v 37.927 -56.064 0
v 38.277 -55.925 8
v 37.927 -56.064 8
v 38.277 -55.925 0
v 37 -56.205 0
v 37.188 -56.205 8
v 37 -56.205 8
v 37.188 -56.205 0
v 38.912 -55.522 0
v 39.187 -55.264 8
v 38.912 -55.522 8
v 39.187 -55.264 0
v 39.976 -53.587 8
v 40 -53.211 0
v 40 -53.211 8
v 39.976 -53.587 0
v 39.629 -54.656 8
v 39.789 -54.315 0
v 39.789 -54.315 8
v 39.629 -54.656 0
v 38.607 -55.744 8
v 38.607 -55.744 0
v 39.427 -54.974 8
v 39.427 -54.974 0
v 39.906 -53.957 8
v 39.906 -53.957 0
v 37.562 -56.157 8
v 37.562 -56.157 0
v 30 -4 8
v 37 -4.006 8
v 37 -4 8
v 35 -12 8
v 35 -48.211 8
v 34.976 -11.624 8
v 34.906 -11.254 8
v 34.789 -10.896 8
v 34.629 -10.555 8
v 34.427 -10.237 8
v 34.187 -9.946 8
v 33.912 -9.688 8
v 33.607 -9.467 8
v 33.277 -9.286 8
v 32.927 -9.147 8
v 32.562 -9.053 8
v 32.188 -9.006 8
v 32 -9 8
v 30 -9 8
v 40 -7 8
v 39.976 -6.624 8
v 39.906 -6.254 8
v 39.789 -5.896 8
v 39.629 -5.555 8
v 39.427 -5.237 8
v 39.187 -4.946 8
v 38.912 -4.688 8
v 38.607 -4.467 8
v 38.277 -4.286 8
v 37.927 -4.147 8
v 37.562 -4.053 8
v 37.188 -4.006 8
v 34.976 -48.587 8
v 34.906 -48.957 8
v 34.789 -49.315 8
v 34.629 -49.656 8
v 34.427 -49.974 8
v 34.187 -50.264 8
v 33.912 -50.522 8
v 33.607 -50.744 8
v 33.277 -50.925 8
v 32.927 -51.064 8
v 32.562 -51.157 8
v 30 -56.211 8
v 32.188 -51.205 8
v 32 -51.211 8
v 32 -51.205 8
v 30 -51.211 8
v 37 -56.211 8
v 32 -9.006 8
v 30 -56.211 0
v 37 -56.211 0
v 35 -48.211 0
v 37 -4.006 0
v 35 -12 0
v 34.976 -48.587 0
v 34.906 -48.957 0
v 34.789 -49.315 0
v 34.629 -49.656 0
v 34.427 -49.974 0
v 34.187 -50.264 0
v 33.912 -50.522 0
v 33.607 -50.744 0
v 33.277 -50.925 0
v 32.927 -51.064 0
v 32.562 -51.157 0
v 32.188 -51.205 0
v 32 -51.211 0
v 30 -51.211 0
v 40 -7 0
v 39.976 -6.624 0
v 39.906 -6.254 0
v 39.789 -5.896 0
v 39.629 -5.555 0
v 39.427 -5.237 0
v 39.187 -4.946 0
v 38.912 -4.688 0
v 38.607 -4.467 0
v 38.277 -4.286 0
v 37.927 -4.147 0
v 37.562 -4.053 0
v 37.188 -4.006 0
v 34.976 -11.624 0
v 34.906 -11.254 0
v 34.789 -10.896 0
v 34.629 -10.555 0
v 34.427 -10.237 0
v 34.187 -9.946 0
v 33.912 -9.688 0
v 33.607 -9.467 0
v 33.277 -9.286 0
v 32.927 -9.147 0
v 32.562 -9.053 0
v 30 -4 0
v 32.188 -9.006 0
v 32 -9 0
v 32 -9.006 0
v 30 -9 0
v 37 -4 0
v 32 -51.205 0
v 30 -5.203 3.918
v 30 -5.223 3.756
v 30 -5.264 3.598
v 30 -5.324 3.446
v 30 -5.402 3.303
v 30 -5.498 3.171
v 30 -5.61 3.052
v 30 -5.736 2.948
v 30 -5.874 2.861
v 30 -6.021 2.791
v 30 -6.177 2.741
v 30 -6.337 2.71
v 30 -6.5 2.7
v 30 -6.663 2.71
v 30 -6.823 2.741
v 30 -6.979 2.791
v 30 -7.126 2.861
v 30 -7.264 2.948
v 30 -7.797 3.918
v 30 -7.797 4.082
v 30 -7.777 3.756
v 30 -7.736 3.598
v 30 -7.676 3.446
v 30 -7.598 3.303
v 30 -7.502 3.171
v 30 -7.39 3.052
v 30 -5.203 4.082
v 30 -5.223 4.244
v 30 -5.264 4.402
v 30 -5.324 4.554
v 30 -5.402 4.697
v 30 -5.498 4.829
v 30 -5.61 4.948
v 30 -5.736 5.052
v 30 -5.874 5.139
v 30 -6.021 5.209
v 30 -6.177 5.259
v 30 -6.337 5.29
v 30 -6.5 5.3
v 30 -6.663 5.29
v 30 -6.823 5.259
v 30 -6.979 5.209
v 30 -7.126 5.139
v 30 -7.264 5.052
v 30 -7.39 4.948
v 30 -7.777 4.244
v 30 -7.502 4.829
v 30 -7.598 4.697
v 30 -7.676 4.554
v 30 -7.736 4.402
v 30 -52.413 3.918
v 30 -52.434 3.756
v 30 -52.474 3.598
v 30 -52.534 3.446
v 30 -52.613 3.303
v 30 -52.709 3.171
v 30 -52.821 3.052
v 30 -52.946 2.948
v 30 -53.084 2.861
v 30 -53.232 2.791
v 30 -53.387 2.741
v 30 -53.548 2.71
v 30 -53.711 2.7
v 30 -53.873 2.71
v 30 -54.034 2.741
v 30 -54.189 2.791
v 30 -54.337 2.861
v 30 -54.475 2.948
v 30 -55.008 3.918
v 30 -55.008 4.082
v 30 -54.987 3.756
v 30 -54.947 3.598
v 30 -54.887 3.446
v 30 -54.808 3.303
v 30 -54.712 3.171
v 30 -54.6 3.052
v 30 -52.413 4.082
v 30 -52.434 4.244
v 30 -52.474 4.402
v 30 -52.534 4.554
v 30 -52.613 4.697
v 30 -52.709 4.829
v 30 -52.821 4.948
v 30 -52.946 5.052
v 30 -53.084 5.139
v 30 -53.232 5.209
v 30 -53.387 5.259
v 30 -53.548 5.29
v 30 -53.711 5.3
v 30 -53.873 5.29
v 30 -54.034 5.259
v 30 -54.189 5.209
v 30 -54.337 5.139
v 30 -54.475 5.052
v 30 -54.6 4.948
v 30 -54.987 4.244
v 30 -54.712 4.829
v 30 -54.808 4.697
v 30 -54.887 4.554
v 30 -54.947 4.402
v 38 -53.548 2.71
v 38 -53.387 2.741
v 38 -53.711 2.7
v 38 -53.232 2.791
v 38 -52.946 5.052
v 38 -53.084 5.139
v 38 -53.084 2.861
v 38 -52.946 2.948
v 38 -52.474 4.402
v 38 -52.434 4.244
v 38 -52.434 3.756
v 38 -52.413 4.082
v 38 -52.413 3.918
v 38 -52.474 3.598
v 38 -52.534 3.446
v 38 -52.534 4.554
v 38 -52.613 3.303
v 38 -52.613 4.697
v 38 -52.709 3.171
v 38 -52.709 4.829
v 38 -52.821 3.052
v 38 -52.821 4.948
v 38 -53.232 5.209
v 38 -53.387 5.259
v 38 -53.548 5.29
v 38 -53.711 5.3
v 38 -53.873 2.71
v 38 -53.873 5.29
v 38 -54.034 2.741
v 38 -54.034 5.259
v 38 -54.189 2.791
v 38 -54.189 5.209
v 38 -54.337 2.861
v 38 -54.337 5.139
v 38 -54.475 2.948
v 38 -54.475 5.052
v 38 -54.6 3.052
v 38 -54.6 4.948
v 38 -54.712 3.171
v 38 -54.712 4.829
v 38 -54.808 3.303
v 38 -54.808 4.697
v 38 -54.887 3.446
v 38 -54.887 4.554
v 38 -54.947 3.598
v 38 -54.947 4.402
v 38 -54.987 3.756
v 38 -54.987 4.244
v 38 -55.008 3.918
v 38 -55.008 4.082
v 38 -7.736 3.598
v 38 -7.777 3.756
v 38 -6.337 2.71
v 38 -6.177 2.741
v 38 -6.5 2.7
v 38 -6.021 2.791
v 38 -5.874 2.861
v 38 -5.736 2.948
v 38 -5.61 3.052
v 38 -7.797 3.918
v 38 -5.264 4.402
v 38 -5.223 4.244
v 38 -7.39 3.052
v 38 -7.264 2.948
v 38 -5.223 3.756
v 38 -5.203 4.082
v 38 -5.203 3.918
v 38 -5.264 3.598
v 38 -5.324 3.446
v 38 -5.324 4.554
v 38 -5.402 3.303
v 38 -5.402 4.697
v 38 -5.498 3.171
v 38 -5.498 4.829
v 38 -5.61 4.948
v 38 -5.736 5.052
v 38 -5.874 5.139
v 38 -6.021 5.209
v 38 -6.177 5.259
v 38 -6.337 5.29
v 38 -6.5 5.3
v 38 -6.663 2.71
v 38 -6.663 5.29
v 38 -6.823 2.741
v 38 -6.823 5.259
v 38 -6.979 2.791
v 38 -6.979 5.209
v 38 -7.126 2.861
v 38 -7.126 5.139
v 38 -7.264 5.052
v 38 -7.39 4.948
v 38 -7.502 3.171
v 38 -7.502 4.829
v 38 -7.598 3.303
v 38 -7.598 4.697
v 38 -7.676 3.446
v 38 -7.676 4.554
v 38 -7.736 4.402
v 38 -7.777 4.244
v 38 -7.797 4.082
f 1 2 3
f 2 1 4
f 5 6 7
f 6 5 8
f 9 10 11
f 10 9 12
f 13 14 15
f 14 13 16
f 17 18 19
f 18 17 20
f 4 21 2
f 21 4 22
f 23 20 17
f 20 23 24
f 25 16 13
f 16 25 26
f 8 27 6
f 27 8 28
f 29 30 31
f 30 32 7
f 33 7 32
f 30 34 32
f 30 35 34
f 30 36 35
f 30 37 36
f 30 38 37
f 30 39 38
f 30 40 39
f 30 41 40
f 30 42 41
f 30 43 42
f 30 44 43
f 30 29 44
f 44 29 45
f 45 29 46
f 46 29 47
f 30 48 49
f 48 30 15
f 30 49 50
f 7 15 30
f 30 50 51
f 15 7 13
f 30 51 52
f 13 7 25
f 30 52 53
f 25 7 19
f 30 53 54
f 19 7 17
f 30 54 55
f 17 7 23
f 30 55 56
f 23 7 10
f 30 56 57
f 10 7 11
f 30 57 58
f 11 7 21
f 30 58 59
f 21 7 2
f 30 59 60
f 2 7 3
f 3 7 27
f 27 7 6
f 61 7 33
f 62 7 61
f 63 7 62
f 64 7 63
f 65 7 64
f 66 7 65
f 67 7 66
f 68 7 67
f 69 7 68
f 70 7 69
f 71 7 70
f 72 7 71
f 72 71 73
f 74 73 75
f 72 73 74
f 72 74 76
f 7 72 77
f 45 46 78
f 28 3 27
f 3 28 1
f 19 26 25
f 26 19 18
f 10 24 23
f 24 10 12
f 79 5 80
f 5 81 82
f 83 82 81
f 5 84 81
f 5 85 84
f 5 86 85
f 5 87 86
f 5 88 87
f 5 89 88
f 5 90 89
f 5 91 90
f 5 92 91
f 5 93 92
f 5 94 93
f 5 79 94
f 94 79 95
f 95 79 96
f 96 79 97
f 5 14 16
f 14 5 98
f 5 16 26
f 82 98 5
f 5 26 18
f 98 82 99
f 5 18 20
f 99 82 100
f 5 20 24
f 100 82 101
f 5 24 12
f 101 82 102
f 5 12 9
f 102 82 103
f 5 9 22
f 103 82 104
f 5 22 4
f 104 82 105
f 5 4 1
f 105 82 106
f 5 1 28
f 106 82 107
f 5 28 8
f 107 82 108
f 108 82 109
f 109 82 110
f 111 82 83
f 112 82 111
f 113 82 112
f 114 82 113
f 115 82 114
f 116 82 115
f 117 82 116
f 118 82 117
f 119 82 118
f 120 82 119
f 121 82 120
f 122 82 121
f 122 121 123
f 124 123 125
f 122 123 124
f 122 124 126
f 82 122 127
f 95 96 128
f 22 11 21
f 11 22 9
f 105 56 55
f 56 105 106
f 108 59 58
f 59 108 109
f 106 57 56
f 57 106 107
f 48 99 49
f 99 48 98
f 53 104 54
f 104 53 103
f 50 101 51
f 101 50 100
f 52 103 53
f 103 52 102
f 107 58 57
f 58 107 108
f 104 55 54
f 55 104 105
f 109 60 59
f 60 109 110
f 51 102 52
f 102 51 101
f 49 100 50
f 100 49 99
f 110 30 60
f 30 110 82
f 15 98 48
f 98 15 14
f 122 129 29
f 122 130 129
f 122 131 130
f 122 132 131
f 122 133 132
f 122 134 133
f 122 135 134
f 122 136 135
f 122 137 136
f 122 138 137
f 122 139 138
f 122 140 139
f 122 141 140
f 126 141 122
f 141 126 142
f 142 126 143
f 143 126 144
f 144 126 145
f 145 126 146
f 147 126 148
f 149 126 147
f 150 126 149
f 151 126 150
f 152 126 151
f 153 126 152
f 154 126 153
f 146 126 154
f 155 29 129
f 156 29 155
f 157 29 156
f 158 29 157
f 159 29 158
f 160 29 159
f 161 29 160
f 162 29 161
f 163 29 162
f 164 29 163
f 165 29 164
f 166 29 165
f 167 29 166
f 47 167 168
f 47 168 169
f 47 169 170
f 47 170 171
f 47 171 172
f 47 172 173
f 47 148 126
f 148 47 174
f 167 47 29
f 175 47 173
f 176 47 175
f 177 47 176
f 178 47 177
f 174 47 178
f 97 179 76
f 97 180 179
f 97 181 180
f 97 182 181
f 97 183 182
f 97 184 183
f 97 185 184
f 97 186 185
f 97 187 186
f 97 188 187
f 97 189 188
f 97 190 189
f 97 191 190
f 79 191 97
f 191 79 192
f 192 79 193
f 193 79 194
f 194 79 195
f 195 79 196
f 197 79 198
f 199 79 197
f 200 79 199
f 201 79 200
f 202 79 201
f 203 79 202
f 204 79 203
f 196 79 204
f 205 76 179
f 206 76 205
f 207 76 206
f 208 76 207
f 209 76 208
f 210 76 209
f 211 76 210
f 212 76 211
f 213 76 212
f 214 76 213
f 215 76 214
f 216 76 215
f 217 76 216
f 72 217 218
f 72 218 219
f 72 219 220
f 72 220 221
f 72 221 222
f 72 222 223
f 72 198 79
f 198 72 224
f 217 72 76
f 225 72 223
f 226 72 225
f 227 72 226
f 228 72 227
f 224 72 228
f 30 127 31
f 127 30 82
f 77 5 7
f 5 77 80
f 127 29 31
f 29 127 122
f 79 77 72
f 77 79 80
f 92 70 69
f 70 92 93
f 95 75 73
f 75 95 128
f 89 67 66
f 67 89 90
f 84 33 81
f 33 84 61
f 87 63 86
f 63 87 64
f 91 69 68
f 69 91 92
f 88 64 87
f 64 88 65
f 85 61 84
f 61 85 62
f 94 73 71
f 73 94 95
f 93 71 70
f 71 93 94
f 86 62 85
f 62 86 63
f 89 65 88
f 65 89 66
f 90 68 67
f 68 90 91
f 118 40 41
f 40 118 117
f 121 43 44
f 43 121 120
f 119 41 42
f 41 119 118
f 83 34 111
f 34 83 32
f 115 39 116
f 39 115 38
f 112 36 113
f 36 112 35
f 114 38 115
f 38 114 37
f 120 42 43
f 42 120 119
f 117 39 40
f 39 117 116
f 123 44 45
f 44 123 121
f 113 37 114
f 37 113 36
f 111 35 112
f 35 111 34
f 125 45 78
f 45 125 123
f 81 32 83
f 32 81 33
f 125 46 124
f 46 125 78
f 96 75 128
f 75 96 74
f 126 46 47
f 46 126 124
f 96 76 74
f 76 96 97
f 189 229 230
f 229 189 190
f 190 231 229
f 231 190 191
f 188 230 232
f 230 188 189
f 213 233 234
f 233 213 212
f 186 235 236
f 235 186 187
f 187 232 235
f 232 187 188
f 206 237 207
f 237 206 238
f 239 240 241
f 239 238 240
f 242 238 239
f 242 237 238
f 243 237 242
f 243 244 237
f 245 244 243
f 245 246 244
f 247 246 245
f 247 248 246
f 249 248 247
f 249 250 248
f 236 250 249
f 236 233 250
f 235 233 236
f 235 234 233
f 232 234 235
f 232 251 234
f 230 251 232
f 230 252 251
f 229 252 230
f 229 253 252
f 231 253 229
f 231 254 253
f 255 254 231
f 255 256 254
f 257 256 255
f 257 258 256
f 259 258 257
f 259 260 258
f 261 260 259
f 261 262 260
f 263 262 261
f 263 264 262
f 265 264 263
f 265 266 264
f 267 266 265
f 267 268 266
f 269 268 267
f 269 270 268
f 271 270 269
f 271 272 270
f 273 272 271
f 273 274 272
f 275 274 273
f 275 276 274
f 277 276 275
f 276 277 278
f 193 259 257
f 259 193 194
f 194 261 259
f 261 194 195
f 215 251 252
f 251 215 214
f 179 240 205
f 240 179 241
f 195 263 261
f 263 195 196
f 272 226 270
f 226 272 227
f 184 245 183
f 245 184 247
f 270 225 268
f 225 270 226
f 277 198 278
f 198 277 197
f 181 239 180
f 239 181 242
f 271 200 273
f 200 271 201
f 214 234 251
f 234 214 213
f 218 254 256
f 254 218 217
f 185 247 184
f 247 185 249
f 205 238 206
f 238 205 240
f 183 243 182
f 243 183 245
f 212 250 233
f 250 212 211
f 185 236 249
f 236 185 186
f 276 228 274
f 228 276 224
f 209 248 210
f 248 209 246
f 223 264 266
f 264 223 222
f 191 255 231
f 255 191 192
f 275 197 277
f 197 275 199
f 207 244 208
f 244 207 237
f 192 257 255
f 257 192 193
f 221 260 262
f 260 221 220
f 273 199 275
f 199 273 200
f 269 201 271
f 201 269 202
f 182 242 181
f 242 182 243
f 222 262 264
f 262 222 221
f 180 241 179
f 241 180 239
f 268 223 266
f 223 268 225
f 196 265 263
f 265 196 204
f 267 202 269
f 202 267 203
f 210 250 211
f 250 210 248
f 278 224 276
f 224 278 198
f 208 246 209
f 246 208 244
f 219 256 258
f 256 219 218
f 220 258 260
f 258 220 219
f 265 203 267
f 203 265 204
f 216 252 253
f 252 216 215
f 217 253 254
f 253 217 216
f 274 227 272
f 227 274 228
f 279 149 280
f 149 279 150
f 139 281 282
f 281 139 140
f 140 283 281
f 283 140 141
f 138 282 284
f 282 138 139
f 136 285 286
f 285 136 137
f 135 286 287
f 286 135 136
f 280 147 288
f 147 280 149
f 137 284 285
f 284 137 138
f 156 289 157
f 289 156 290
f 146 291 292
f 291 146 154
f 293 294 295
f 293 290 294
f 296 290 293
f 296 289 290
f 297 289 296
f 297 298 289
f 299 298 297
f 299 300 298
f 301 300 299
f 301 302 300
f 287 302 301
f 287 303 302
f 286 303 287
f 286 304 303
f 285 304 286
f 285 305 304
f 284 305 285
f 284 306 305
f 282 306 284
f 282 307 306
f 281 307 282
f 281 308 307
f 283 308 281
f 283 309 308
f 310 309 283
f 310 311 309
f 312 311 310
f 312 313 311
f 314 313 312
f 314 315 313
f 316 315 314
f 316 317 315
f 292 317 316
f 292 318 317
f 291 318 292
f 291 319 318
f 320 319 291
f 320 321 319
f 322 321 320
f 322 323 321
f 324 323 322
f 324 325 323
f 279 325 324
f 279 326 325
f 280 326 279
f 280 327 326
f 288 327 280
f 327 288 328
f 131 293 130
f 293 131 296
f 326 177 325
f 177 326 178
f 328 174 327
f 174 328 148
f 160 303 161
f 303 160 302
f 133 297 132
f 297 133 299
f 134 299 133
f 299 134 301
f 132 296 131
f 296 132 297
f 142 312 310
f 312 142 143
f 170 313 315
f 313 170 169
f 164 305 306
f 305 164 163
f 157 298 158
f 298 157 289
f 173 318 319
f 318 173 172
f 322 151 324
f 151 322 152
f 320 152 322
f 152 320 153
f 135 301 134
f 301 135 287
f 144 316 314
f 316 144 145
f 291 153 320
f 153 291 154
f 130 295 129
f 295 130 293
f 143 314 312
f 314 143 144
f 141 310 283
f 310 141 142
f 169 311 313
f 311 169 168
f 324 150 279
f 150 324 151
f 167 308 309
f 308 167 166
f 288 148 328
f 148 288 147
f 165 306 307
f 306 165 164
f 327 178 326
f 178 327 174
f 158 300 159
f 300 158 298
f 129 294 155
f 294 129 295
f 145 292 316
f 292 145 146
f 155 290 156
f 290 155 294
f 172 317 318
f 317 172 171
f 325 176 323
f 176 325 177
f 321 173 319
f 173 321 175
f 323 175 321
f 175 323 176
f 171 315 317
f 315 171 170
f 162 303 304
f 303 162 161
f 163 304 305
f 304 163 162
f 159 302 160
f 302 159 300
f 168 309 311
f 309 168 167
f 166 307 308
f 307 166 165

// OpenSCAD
//Which part to print
Part = "c"; // [a:Frame, b:Drawer, c:Handles]

//Height of drawer in units
u = 2;

//Depth of drawer
dp = 115;

//Slip between drawer and frame
slip=0.5;


go();
module go(){    
        if(Part=="a"){
            print_frame();
        }else if(Part=="b"){
            print_drawer();
        }else if(Part=="c"){
            print_handles();
        }
}
            



module print_frame(){
    difference(){
        frontplate(u,[],[],[],[],[]);       
        translate([30,0,0]){cube([width-20,u*unit,dp]);}       
    }    
    difference(){
        translate([28,0,gauge]){cube([width-20+4,u*unit,dp]);}
        translate([30,2,gauge-1]){cube([width-20,u*unit-4,dp+2]);}
        }
    translate([20,0,gauge]){cube([115,2,dp]);}
    translate([20,u*unit-2,gauge]){cube([115,2,dp]);}
}



module print_drawer(){
    half = (width+40)/2;
    hhhd = (4*unit-9)/2; //half handle hole distance for 4U handle
    intersection(){
        difference(){
            frontplate(u,[],[],[],[],[]);       
            translate([20,0,gauge]){cube([width,u*unit,gauge]);}//remove support            
                translate([half+hhhd,(u*unit)/2,gauge-0.25]){rotate([180,0,0]){screw();}}
                translate([half-hhhd,(u*unit)/2,gauge-0.25]){rotate([180,0,0]){screw();}}
        }
        translate([30+slip,0,0]){cube([width-20-slip*2,u*unit,dp]);}       
    } 
    
    difference(){
        translate([30+slip,2+slip,gauge]){cube([width-20-2*slip,u*unit-4-2*slip,dp]);}    
        translate([30+slip+2,2+slip+2,gauge-0.01]){cube([width-20-2*slip-4,u*unit-4-2*slip,dp-2]);}
    }
}
    
  
module print_handles(){      
   // handle(u,true);
    difference(){ //remove the extra handle, it prints a set.
        translate([30,0,0]){handle(4,true);}
        translate([42,-100,-1]){cube([20,100,10]);}
    }
}















































$fn = 50*1;

//Constants, do not change !
sixinch   = 155*1;       // cm = 6"  
width     = 155-20-20;   // 11.5cm between rails
unit      = (44.5/19)*6; // 1U
gauge     = 3*1;
gauge_box = 2*1;

//Cabinet screws in mm. They can be changed a little
screw_head        = 7.4; 
screw_head_height = 2.2;  
screw_dia         = 3;   
screw_hole        = 2.6; 
screw_length      = 15;
nut_4mm           = 8.1; 
slip              = 0.35;




module chimney() {    
for(i=[0:8:80]){
    echo(i);
    translate([20 + (width-80)/2  +i,-1,20]){
        minkowski(){
            cube([0.01,200,30]);    
            sphere(d=2,h=1);        
        }
    }
}
}



 
     
 module back_plate(u,dp,screw_top,screw_bottom,screw_side,square_hole,round_hole){
    
     difference(){
        union(){
            translate([20+gauge_box+slip,gauge_box+slip,gauge+dp-gauge_box]){
                cube([width-2*gauge_box-2*slip, u*unit-2*gauge_box-2*slip, gauge_box]);
            }
        }
     
     //Square holes
        for(i=[0:len(square_hole)-1]){
            x = square_hole[i][0];
            y = square_hole[i][1];
            w = square_hole[i][2];
            h = square_hole[i][3];            
            translate([x+20+gauge_box,y+gauge_box,dp-1]){cube([w,h,gauge+2]);}        
        } 
    
    //Round holes
    if(len(round_hole)>0){
        for(i=[0:len(round_hole)-1]){
            x = round_hole[i][0];
            y = round_hole[i][1];
            dia = round_hole[i][2];
            translate([20+gauge_box+x,gauge_box+y,dp-4]){  cylinder(d=dia,h=10); }
        }
    }
        
    
    //Screw holes
    if(len(screw_top)>0){
        for(i=[0:len(screw_top)-1]){
            p = screw_top[i];
            translate([p,unit*u-gauge_box-4,gauge+dp+0.1]){rotate([0,180,0]){screw();}}
            translate([sixinch-p,unit*u-gauge_box-4,gauge+dp+0.1]){rotate([0,180,0]){screw();}} 
        }
    }
    if(len(screw_bottom)>0){
        for(i=[0:len(screw_bottom)-1]){
            p = screw_bottom[i]; 
            translate([p,gauge_box+4     ,gauge+dp+0.1]){rotate([0,180,0]){screw();}}
            translate([sixinch-p,    gauge_box+4    ,gauge+dp+0.1]){rotate([0,180,0]){screw();}} 
        }
    }
    
    if(len(screw_side)>0){
        for(i=[0:len(screw_side)-1]){
            p = screw_side[i];  
            translate([sixinch-20-6,    unit*p    ,gauge+dp+0.1]){rotate([0,180,0]){screw();}} 
            translate([20+6,    unit*p    ,gauge+dp+0.1]){rotate([0,180,0]){screw();}}   
        }
    }
}
}

 
 


module peg(x,y,od,id,he){
    translate([x,y,0]){
        rotate([-90,0,0]){
            difference(){
                cylinder(r2=od/2,r1=od*1.5,h=he);
                translate([0,0,-0.5]){cylinder(r1=id/2,h=he+1);}
            }        
        }
    }
}



module screwtrap(){  
    difference(){
        translate([0,0,5]){
            intersection(){
                scale([1,1,0.7]){
                    sphere(r=8);     
                }   
                translate([0,-0.001,-10]){  cube([20,20,20]);}
            }
        }  
        translate([2,4,5]){
            rotate([90,90,90]){
               translate([0,0,-10]){ cylinder(r=screw_dia/2,h=20,$fn=100);}
            }
        }    
    }
}





module nuttrap(){
    difference(){
        linear_extrude(10){
            polygon(points=[[0,0],[8,0],[2,8],[0,8]]);
        }
        translate([2,4,5]){
            rotate([90,90,90]){
                cylinder(r=nut_4mm/2,h=20,$fn=6);
            }
        }
        translate([2,4,5]){
            rotate([90,90,90]){
               translate([0,0,-10]){ cylinder(r=screw_dia/2,h=20,$fn=100);}
            }
        }
    }
}








module cabinet (dp,u,screw_bottom_front,round_peg,screw_side_front){
    difference(){
        box(dp,u,screw_bottom_front,round_peg,screw_side_front);
                        
               translate([20,unit/2+3,sixinch-40]){ cylinder(d=gauge_box,h=41);}
               translate([20,unit/2+0,sixinch-40]){ cylinder(d=gauge_box,h=41);}
               translate([20,unit/2-3,sixinch-40]){ cylinder(d=gauge_box,h=41);}
            
               translate([20+width,unit/2+3,sixinch-40]){ cylinder(d=gauge_box,h=41);}
               translate([20+width,unit/2+0,sixinch-40]){ cylinder(d=gauge_box,h=41);}
               translate([20+width,unit/2-3,sixinch-40]){ cylinder(d=gauge_box,h=41);}
               
              
        }
       
    }





module box(dp,u,screw_bottom_front,round_peg,screw_side_front){
    difference(){
        translate([20,0,gauge]){
            difference(){
                cube([115,u*unit,dp]);
                translate([gauge_box,gauge_box,-1]){ cube([115-gauge_box*2,u*unit,dp+2]);}                        
            }            
        }
        //CHIMNEY
        chimney(); 
    }
    
    //Screw mounts on the bottom plate
    for(i=[0:len(screw_bottom_front)-1]){
        p = screw_bottom_front[i];
        translate([p+5,gauge_box,gauge]){rotate([0,-90,0]){screwtrap();}}
        translate([sixinch-p+5,gauge_box,gauge]){rotate([0,-90,0]){screwtrap();}}        
        translate([p-5,gauge_box,gauge+dp-gauge_box]){rotate([0,90,0]){screwtrap();}}
        translate([sixinch-p-5,gauge_box,gauge+dp-gauge_box]){rotate([0,90,0]){screwtrap();}}
   }
    
   //Screw mounts on the side of cabinet
   if(len(screw_side_front)>0){
        for(i=[0:len(screw_side_front)-1]){
            p = screw_side_front[i]*unit;
                translate([20+gauge_box,p-5,gauge]){rotate([0,-90,-90]){screwtrap();}}
                translate([sixinch-20-gauge_box,p+5,gauge]){rotate([0,-90,90]){screwtrap();}}    
                translate([20+gauge_box,p+5,gauge+dp-gauge_box]){rotate([0,90,-90]){screwtrap();}}
                translate([sixinch-20-gauge_box,p-5,gauge+dp-gauge_box]){rotate([0,90,90]){screwtrap();}}    
        }
    }
    
    //Screw mounts for lid. Two on each side, three if dp>90
    translate([20+gauge_box,unit*u-gauge_box,gauge+10]){           rotate([0,0,-90]){screwtrap();}}    
    translate([20+gauge_box,unit*u-gauge_box,gauge+dp-10-10]){       rotate([0,0,-90]){screwtrap();}}            
    translate([sixinch-20-gauge_box,unit*u-gauge_box,gauge+10+10]){  rotate([180,0,-90]){screwtrap();}}
    translate([sixinch-20-gauge_box,unit*u-gauge_box,gauge+dp-10-10+10]){  rotate([180,0,-90]){screwtrap();}}
    if(dp>90){
        translate([sixinch-20-gauge_box,unit*u-gauge_box,gauge+dp/2-5+10]){rotate([180,0,-90]){screwtrap();}}
        translate([20+gauge_box,unit*u-gauge_box,gauge+dp/2-5]){rotate([0,0,-90]){screwtrap();}}
    }
    
    //Vertical print support
    /*translate([20+gauge_box,0,gauge+10+2])       {cube([7,u*unit-gauge_box,0.5]);}
    translate([20+gauge_box,0,gauge+dp-10-10+2]) {cube([7,u*unit-gauge_box,0.5]);}    
    translate([sixinch-20-gauge_box-7,0,gauge+10+2])       {cube([7,u*unit-gauge_box,0.5]);}
    translate([sixinch-20-gauge_box-7,0,gauge+dp-10-10+2]) {cube([7,u*unit-gauge_box,0.5]);}
    if(dp>90){
       translate([20+gauge_box,0,gauge+dp/2-3])       {cube([7,u*unit-gauge_box,0.5]);}
       translate([sixinch-20-gauge_box-7,0,gauge+dp/2-3])       {cube([7,u*unit-gauge_box,0.5]);}
    }*/
    
    
    
    module sup(){
        translate([0,-u*unit+gauge_box,2]){
            cube([7,u*unit-gauge_box,0.5]);
        }
    } 
    
    //Lid rest bar 
    translate([20+gauge_box,unit*u-3-gauge_box,gauge]){
        linear_extrude(dp-gauge_box){polygon (points=[[0,0],[3,3],[0,3]]);}
    }
    translate([sixinch-20-gauge_box,unit*u-3-gauge_box,gauge]){
        linear_extrude(dp-gauge_box){polygon (points=[[0,0],[-3,3],[0,3]]);}
    }
        
    // Back/front rest bar
    
    translate([20,gauge_box,dp+gauge-3-gauge_box]){
        rotate([0,90,0]){
            linear_extrude(width){polygon (points=[[-3,0],[-3,3],[0,0]]);}
        }
    }
    
    translate([20+width-gauge_box,0,dp+gauge-3-gauge_box]){
        rotate([0,90,90]){
            linear_extrude(unit*u-gauge_box){polygon (points=[[-3,0],[-3,3],[0,0]]);}
        }
    }
    
    translate([ 20+gauge_box ,0,dp+gauge-3-gauge_box]){
        rotate([0,90,90]){
            linear_extrude(unit*u-gauge_box){polygon (points=[[-3,0],[-3,-3],[0,0]]);}
        }
    }
    
    
/*    translate([0,0,dp+gauge-2-gauge_box]){
        difference(){
            translate([20,0,0]){  cube([width,unit*u-gauge_box,2]);  }
            translate([20+gauge_box+2,gauge_box+2,-1]){  cube([width-2*gauge_box-4,unit*u,4]);  }        
        }
    }*/
              
    //PEGS Relative to inside corner
    translate([20+gauge_box,0,gauge]){ 
        if(len(round_peg)>0){
            for(i=[0:len(round_peg)-1]){
                x = round_peg[i][0];
                y = round_peg[i][1];
                od = round_peg[i][2];
                id = round_peg[i][3];  
                he = round_peg[i][4];      
                translate([x,0,y]){peg(0,0,od,id,he); }
             }        
        }
    }    
}


module lid(dp,u,screw_front,screw_back){    

    difference(){
    union(){ 
        if(len(screw_front)>0){
            for(i=[0:len(screw_front)-1]){                                
                p = screw_front[i];                
                translate([p-5,unit*u-gauge_box,gauge]){rotate([0,-90,180]){screwtrap();}}
                translate([sixinch-p-5,unit*u-gauge_box,gauge]){rotate([0,-90,180]){screwtrap();}}
            }
        }        
        if(len(screw_back)>0){
            for(i=[0:len(screw_back)-1]){                                
                p = screw_back[i];                                
                translate([p+5,unit*u-gauge_box,gauge+dp-gauge_box]){rotate([0,90,180]){screwtrap();}}
                translate([sixinch-p+5,unit*u-gauge_box,gauge+dp-gauge_box]){rotate([0,90,180]){screwtrap();}} 
            }
        }

        //lid
        translate([20+gauge_box+slip,u*unit-gauge_box,gauge]){
            cube([115-gauge_box*2-slip*2,gauge_box,dp]);
        }    
        //back rest
        translate([sixinch/2-40,u*unit-gauge_box-2,gauge+dp-2-gauge_box]){
            cube([80,2,2]);
        }
    }        

    //Negative
    translate([20+gauge_box+4,unit*u+0.01  ,gauge+10+5]){rotate([90,0,0]){screw();}}
    translate([20+gauge_box+4,unit*u+0.01  ,gauge+dp-10-10+5]){rotate([90,0,0]){screw();}}    
    translate([sixinch-20-gauge_box-4,unit*u+0.01   ,gauge+10+10-5]){rotate([90,0,0]){screw();}}
    translate([sixinch-20-gauge_box-4,unit*u +0.01  ,gauge+dp-10-10+10-5]){rotate([90,0,0]){screw();}}
    if(dp>90){
        translate([sixinch-20-gauge_box-4,unit*u+0.01   ,gauge+dp/2-5+10-5]){rotate([90,0,0]){screw();}}    
        translate([20+gauge_box+4,unit*u+0.01   ,gauge+dp/2-5+5]){rotate([90,0,0]){screw();}}
    }
     chimney();

    
}        
}




module screw(){
    cylinder(r1=screw_head/2, r2=screw_dia/2, h=screw_head_height);
    cylinder(r=screw_dia/2, h=40);    
    translate([0,0,-0.99]){cylinder(r=screw_head/2, h=1);}    
}


module frontholes(u,screw_top,screw_bottom_front,screw_side_front){
    if(len(screw_bottom_front)>0){ 
    for(i=[0:len(screw_bottom_front)-1]){
        p = screw_bottom_front[i];
        translate([p,gauge_box+4,-0.01]){screw();}
        translate([sixinch-p,gauge_box+4,-0.01]){screw();}
    } 
    }    
    if(len(screw_side_front)>0){   
        for(i=[0:len(screw_side_front)-1]){
            p = screw_side_front[i]*unit;
            translate([20+gauge_box+4,p,-0.01]){screw();}
            translate([sixinch-20-gauge_box-4,p,-0.01]){screw();}    
        } 
    }   
    if(len(screw_top)>0){   
    for(i=[0:len(screw_top)-1]){
        p = screw_top[i];
        translate([p,unit*u-gauge_box-4,-0.01]){screw();}
        translate([sixinch-p,unit*u-gauge_box-4,-0.01]){screw();}    
    }
    }
}  
    




module handle(u,print){
    
    if(print){
        translate([16,-u*unit,8]){rotate([0,90,0]){handle1(u);}}
        translate([0,-u*unit,8]){rotate([0,90,0]){handle1(u);}}
    }else{
        translate([22,2,0]){rotate([0,180,0]){handle1(u);}}
        translate([sixinch-14,2,0]){rotate([0,180,0]){handle1(u);}}        
    }        
}

module handle1(u){
    difference(){
        handle2(8,u*unit-4,10,3);
        translate([-1,5,-1]){handle2(10,u*unit-10-4,6,3);}
    
        translate([4,2.5,-1]){          cylinder(r=screw_hole/2,h=9);}
        translate([4,u*unit-4-2.5,-1]){ cylinder(r=screw_hole/2,h=9);}
    }
}


module handle2(w,h,d,ra){          
    translate([0,ra,d-ra]){
        rotate([0,90,0]){
            cylinder(r=ra,h=w);
        }
    }
    translate([0,h-ra,d-ra]){
        rotate([0,90,0]){
            cylinder(r=ra,h=w);
        }
    }        
    translate([0,ra,0]){
        cube([w,h-ra-ra,d]);
    }
    cube([w,h,d-ra]);    
}





module insideprofile(l){
    difference(){
        union(){
            translate([7.6,10,0]){cube([4.8,10,l]);}
            translate([0,7.6,0]){cube([20,4.8,l]);}  
            
            translate([6.5,10-2.1,0]){cube([7   ,10,l]);}
            translate([2.1,6.5,0]){cube([15.8,7   ,l]);}  
        }
        translate([4,4,-1]){
            cube([12,12,l+2]);
        }
    } 
    translate([20,20,0]){
        rotate([0,-90,0]){
            linear_extrude(20){
                polygon (points=[[0,0],[l,0],[0,l]]);
            }
        }
    }    
}



module rightbottomplate(t){
    difference(){
        bottomplate(t);
        translate([-1,-1,-1]){
            cube([(sixinch+20)/2+1,sixinch+20+2,t+2]);
        }
    }
}

module leftbottomplate(t){
    difference(){
        bottomplate(t);
        translate([(sixinch+20)/2,-1,-1]){
            cube([(sixinch+20)/2+1,sixinch+20+2,t+2]);
        }
       # translate([10,10,-1]){cylinder(r=2.5,h=base+2);}
        translate([10,sixinch+20-10,-1]){cylinder(r=2.5,h=base+2);}
    
        
        translate([(sixinch+20)/2-20,-1,2.1]){cube([40,sixinch+20+2,2]);}
        
        }
    
    translate([0,0,base]){insideprofile(10);}
    rotate([0,0,180]){translate([-20,-sixinch-20,base]){insideprofile(10);}}   
}


module bottomplate(t){
translate([1,1,0]){
    minkowski(){
        cube([sixinch+20-2,sixinch+20-2,t-1]);
        cylinder(r=1,h=1);
    }
}
}




module frontplate(u,square_hole,round_hole,round_peg,screw_side_front,screw_top,screw_bottom_front){

    difference(){
        baseplate(u);
        
                   
        
        //Square holes
        if(len(square_hole)>0){
        for(i=[0:len(square_hole)-1]){
            x = square_hole[i][0];
            y = square_hole[i][1];
            w = square_hole[i][2];
            h = square_hole[i][3];            
            translate([x,y,-1]){cube([w,h,gauge+2]);}        
        } 
        }
        
       //Round holes
        if(len(round_hole)>0){
        for(i=[0:len(round_hole)-1]){
            x = round_hole[i][0];
            y = round_hole[i][1];
            d = round_hole[i][2];                       
            translate([x,y,-1]){cylinder(r=d/2,gauge+1);}        
        }   
    }

        //Cabinet holes
        frontholes(u,screw_top,screw_bottom_front,screw_side_front);
        
        //Handle holes
        translate([18,4.5,gauge-0.25]){rotate([180,0,0]){screw();}}
        translate([18,u*unit-4.5,gauge-0.25]){rotate([180,0,0]){screw();}}        
        translate([sixinch-18,4.5,gauge-0.25]){rotate([180,0,0]){screw();}}
        translate([sixinch-18,u*unit-4.5,gauge-0.25]){rotate([180,0,0]){screw();}}
    } 

    //chassis support
    /*
    translate([20+gauge_box,gauge_box,gauge]){
        difference(){
            cube([115-gauge_box*2,u*unit-2*gauge_box,3]);
            translate([gauge_box,gauge_box,-1]){ cube([115-gauge_box*4,u*unit-gauge_box*4,5]);}
        }
    } */



     //Handle base
    /*
        translate([14,0,0]){
            cube([8,u*unit,gauge/2]);
        }
        translate([sixinch-22,0,0]){
            cube([8,u*unit,gauge/2]);
        }
    */

    //Support pegs
    if(len(round_peg)>0){
        for(i=[0:len(round_peg)-1]){
            x = round_peg[i][0];
            y = round_peg[i][1];
            od = round_peg[i][2];
            id = round_peg[i][3];  
            he = round_peg[i][4];  
            translate([x,y,gauge]){
                difference(){
                 #   cylinder(r=od/2,h=he);
                 #   cylinder(r=id/2,h=he+1);
                }        
            }
    
        }
    }
    
    //cabinet support bars
    translate([0,0,gauge]){
        translate([20+width*0.25,gauge_box,0]){  cube([width*0.5,1,1.5]);  }
        translate([20+width*0.25,unit*u-1-gauge_box,0]){  cube([width*0.5,1,1.5]);  }           
    }
    
    
    
    }








module baseplate(u,handle){
    difference(){
    union(){
        translate([1.25,1.25,1.25]){
            minkowski(){
                cube([sixinch-2.5,unit*u-2.5,gauge-2.5]);
                sphere(r=1.25);
            }
        }
    }
    //Rack mount holes
    translate([10-0.5,unit/2,-gauge/2])                 {cylinder(r=2.3,gauge*2);}
    translate([sixinch-10+0.5,unit/2,-gauge/2])         {cylinder(r=2.3,gauge*2);}
    translate([10-0.5,u*unit-(unit/2),-gauge/2])        {cylinder(r=2.3,gauge*2);}
    translate([sixinch-10+0.5,u*unit-(unit/2),-gauge/2]){cylinder(r=2.3,gauge*2);}
    if(u>=5){
        translate([10-0.5,(u*unit)/2,-gauge/2])         {cylinder(r=2.3,gauge*2);}
        translate([sixinch-10+0.5,(u*unit)/2,-gauge/2]) {cylinder(r=2.3,gauge*2);}
    }  
}    
}


module fan(sz,vent,hole,grid,head,d){
    difference(){
        intersection(){
            translate([sz/2,sz/2,0]){cylinder(d=vent,h=d);}    
            translate([-hole/2,-hole/2,0]){cube([sz+hole,sz+hole,d]);}
        }        
        for(i=[-grid*8:grid:grid*8]){        
            translate([sz/2+i,sz/2,5]){
                rotate([0,0,45]){
                    cube([2,100,12],center=true);        
                }
            }
            translate([sz/2+i,sz/2,5]){
                rotate([0,0,-45]){
                    cube([2,100,12],center=true);        
                }
            }
        }        
    }
    translate([0,0,0])  {cylinder(d=hole,h=d); cylinder(d1=head,d2=0,h=head/1.5);  }
    translate([sz,0,0]) {cylinder(d=hole,h=d); cylinder(d1=head,d2=0,h=head/1.5);  }
    translate([sz,sz,0]){cylinder(d=hole,h=d); cylinder(d1=head,d2=0,h=head/1.5);  }
    translate([0,sz,0]) {cylinder(d=hole,h=d); cylinder(d1=head,d2=0,h=head/1.5);  }        
}
